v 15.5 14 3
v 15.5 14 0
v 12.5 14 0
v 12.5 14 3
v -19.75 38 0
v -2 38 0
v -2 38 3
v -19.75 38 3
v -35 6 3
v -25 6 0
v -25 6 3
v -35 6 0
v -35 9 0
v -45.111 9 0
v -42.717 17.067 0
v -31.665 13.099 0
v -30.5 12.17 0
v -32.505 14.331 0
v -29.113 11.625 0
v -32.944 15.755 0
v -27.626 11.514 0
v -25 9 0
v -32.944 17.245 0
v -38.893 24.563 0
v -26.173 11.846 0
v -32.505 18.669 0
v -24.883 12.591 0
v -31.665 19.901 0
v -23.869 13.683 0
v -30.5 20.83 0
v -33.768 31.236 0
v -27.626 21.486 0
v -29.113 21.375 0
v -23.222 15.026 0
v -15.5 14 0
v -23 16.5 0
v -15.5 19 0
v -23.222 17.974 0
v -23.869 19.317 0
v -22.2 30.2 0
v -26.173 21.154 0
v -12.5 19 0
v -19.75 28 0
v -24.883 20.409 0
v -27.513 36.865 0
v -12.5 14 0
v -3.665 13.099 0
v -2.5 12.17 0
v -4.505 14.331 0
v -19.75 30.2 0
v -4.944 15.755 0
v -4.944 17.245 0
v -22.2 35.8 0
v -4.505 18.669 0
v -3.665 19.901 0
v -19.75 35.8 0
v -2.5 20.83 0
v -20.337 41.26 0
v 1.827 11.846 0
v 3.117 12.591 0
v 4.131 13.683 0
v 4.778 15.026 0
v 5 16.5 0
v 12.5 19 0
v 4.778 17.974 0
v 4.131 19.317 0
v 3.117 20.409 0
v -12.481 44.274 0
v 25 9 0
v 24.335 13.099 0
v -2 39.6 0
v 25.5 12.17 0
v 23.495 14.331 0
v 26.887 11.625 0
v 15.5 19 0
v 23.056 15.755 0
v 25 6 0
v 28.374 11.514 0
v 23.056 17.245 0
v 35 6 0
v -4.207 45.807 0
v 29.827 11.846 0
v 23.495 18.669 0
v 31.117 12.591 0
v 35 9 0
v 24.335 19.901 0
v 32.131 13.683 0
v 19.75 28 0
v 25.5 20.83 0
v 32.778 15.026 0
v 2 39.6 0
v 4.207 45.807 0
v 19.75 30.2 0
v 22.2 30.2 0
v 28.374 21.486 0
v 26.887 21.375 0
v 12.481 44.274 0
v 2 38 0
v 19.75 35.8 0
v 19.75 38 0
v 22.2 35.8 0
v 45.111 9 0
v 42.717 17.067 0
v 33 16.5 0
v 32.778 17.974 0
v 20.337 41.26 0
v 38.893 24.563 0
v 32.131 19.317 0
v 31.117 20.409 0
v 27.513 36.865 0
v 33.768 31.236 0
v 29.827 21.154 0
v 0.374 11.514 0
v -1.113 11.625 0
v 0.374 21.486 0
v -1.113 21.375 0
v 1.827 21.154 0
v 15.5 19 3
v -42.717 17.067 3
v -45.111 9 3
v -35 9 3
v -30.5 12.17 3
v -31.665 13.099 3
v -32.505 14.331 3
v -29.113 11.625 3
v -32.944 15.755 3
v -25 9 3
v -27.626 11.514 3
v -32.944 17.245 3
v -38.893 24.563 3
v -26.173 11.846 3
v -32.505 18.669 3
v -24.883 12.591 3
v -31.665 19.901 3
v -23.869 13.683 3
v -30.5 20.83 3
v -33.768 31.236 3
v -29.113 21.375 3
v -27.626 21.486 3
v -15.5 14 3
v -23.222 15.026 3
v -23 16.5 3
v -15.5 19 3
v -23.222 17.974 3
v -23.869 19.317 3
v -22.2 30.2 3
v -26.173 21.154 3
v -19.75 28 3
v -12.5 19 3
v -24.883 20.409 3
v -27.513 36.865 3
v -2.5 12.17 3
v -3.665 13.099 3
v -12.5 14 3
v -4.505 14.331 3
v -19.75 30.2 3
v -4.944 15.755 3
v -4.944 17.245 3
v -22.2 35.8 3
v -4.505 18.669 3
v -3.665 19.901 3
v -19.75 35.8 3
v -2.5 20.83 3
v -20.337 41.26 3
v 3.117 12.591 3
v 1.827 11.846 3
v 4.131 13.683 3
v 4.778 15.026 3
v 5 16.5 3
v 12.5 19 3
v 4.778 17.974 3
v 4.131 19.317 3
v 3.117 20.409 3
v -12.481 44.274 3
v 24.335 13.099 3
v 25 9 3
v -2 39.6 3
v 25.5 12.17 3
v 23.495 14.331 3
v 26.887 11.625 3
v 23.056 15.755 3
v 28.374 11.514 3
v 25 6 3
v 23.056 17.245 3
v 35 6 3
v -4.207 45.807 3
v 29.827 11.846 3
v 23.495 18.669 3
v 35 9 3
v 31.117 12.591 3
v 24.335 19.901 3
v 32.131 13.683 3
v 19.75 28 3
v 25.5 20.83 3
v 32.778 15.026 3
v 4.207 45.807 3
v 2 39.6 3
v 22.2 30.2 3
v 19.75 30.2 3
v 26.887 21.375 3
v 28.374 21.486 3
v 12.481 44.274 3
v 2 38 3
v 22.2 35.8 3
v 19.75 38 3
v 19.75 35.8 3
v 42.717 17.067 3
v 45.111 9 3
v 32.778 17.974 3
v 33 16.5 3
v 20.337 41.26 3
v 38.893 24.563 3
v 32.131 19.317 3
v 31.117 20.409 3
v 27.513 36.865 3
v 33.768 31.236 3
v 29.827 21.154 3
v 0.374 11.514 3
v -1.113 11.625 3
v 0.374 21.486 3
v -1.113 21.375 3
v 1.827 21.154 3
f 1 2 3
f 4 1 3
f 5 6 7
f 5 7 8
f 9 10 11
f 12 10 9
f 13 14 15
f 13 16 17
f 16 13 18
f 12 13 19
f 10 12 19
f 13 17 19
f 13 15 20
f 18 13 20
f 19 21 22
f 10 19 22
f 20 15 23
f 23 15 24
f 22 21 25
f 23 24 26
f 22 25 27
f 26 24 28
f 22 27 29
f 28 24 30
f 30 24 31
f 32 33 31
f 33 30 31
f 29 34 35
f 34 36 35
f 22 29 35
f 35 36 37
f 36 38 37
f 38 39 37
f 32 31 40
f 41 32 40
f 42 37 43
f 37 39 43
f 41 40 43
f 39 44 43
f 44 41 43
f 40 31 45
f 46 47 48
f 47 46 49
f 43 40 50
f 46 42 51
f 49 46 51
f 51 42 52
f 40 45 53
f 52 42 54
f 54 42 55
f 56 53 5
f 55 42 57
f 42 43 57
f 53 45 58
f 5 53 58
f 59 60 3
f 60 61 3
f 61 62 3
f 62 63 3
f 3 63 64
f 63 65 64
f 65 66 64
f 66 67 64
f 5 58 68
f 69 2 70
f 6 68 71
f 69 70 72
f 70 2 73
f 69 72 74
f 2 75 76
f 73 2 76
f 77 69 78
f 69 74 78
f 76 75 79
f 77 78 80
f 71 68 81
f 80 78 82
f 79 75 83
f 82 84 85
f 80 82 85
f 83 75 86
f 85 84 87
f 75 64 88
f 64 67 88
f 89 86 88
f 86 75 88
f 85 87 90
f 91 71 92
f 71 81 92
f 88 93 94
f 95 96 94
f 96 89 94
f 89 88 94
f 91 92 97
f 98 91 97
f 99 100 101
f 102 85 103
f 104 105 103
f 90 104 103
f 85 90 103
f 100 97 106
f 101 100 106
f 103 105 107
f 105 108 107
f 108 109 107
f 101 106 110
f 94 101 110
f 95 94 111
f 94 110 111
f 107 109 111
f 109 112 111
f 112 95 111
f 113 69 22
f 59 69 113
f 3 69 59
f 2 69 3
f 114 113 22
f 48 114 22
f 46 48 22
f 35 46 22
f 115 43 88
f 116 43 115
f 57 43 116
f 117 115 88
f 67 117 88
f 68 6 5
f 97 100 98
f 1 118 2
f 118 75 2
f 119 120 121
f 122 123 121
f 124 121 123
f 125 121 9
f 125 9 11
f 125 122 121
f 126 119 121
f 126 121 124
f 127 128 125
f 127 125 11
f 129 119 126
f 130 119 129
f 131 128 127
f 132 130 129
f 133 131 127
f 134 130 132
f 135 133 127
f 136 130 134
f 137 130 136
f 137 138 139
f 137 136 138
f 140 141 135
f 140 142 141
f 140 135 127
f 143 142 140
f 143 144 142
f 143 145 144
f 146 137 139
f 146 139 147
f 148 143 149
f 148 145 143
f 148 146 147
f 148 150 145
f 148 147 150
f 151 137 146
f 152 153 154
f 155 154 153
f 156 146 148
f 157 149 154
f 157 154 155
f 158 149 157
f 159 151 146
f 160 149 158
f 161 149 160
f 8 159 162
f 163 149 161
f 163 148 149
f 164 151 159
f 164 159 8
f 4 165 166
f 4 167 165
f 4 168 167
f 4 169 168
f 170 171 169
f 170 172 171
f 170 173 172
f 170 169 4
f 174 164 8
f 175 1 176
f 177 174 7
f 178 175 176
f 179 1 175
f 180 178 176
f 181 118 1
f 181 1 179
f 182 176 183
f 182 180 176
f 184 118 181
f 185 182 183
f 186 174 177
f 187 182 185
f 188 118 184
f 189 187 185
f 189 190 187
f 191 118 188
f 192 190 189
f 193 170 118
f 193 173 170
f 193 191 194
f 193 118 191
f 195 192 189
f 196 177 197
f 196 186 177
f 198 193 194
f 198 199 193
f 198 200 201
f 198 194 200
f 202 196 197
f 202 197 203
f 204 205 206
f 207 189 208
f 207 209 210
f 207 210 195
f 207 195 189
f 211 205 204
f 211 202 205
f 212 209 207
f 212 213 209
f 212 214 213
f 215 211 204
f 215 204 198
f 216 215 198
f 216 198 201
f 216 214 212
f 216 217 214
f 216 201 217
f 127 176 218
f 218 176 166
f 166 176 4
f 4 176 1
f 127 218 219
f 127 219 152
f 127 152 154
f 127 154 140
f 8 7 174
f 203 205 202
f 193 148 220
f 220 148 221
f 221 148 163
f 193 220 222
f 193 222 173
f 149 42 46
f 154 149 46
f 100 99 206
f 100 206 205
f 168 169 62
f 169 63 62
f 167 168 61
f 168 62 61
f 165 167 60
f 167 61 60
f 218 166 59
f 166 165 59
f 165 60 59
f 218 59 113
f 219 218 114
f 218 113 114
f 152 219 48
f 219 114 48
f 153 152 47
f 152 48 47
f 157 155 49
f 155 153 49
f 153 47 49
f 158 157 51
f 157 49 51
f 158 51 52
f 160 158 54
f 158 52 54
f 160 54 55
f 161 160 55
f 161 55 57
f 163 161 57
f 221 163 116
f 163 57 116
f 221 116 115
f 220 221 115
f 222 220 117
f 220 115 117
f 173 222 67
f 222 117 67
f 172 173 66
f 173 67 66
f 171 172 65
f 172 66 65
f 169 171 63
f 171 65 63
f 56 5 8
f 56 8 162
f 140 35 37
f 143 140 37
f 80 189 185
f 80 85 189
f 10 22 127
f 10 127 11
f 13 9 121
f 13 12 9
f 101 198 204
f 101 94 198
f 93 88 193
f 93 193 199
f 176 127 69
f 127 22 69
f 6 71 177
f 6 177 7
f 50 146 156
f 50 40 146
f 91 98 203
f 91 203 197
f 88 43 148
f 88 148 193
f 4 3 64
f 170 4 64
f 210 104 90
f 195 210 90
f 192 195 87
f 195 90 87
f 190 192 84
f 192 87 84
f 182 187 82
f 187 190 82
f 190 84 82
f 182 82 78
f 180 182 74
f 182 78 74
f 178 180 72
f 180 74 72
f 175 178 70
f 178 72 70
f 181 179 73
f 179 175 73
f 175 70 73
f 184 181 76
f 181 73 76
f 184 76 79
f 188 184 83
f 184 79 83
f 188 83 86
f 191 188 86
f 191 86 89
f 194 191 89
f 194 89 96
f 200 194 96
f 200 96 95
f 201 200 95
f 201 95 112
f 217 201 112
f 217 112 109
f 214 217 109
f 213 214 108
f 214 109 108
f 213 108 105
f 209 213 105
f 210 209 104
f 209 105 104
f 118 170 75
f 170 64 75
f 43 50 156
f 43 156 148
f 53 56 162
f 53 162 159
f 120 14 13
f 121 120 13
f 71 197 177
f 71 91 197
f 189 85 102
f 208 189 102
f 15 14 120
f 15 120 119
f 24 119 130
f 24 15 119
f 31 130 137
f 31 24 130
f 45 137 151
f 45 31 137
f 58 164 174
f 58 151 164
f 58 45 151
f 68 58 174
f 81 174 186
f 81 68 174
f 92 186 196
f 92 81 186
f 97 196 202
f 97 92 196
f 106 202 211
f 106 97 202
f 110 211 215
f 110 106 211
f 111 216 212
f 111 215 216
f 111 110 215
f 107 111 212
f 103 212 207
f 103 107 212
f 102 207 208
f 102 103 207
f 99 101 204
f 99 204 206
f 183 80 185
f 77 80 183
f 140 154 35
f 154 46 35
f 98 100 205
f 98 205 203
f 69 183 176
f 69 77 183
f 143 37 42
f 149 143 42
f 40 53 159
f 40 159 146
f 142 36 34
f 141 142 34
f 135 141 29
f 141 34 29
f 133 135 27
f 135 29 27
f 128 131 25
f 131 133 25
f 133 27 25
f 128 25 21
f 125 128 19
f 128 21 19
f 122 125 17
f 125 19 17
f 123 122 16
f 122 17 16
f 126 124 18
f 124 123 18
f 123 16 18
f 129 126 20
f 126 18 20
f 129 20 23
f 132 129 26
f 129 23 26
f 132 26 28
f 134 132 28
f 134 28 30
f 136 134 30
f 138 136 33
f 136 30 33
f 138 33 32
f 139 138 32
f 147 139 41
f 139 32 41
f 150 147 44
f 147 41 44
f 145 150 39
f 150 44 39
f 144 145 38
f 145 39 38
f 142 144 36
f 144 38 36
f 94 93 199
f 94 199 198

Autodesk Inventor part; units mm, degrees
ref_plane "YZ Plane" through (0, 0, 0) normal (1, 0, 0) x (0, 1, 0)
ref_plane "XZ Plane" through (0, 0, 0) normal (0, 1, 0) x (-1, 0, 0)
ref_plane "XY Plane" through (0, 0, 0) normal (0, 0, 1) x (1, 0, 0)
sketch "Sketch1" plane through (0, 0, 0) normal (0, 0, 1) x (1, 0, 0)
  arc A0 (45.111, 9) -> (-45.111, 9) centre (0, 0) ccw
  line L0 (35, 9) -> (35, 6)
  line L1 (35, 6) -> (25, 6)
  line L2 (25, 6) -> (25, 9)
  line L3 (-25, 9) -> (-25, 6)
  line L4 (-25, 6) -> (-35, 6)
  line L5 (-35, 6) -> (-35, 9)
  line L6 (-45.111, 9) -> (-35, 9)
  line L7 (-25, 9) -> (25, 9)
  line L8 (35, 9) -> (45.111, 9)
  line L9 (-22.2, 35.8) -> (-22.2, 30.2)
  line L10 (-22.2, 30.2) -> (-19.75, 30.2)
  line L11 (-19.75, 30.2) -> (-19.75, 28)
  line L12 (19.75, 28) -> (19.75, 30.2)
  line L13 (19.75, 30.2) -> (22.2, 30.2)
  line L14 (22.2, 30.2) -> (22.2, 35.8)
  line L15 (22.2, 35.8) -> (19.75, 35.8)
  line L16 (19.75, 35.8) -> (19.75, 38)
  line L17 (19.75, 38) -> (2, 38)
  line L18 (2, 38) -> (2, 39.6)
  line L19 (2, 39.6) -> (-2, 39.6)
  line L20 (-2, 39.6) -> (-2, 38)
  line L21 (-2, 38) -> (-19.75, 38)
  line L22 (-19.75, 38) -> (-19.75, 35.8)
  line L23 (-19.75, 35.8) -> (-22.2, 35.8)
  line L24 (-19.75, 28) -> (19.75, 28)
  line L25 (-15.5, 19) -> (-12.5, 19)
  line L26 (-12.5, 19) -> (-12.5, 14)
  line L27 (-12.5, 14) -> (-15.5, 14)
  line L28 (-15.5, 14) -> (-15.5, 19)
  line L29 (12.5, 19) -> (15.5, 19)
  line L30 (15.5, 19) -> (15.5, 14)
  line L31 (15.5, 14) -> (12.5, 14)
  line L32 (12.5, 14) -> (12.5, 19)
  circle A1 centre (0, 16.5) radius 5
  circle A2 centre (-28, 16.5) radius 5
  circle A3 centre (28, 16.5) radius 5
  dimension "d7" = 46
  dimension "d8" = 50
  dimension "d9" = 10
  dimension "d10" = 10
  dimension "d12" = 5.6
  dimension "d13" = 2.2
  dimension "d14" = 4
  dimension "d15" = 39.5
  dimension "d17" = 5.6
  dimension "d18" = 2.2
  dimension "d22" = 17.75
  dimension "d23" = 44.4
  dimension "d24" = 39.5
  dimension "d25" = 2.2
  dimension "d26" = 2.2
  dimension "d27" = 2.45
  dimension "d28" = 2.45
  dimension "d29" = 11.6
  dimension "d30" = 22.2
  dimension "d31" = 28
  dimension "d34" = 5
  dimension "d35" = 3
  dimension "d36" = 5
  dimension "d37" = 3
  dimension "d38" = 5
  dimension "d39" = 5
  dimension "d40" = 25
  dimension "d41" = 12.5
  dimension "d44" = 10
  dimension "d45" = 10
  dimension "d46" = 10
  dimension "d47" = 12.5
  dimension "d48" = 12.5
  dimension "d49" = 12.5
extrude "Extrusion3" add sketch "Sketch1" along normal blind 3
properties part number "OpenROV_Dev_EChassis_Plug_Mount"
